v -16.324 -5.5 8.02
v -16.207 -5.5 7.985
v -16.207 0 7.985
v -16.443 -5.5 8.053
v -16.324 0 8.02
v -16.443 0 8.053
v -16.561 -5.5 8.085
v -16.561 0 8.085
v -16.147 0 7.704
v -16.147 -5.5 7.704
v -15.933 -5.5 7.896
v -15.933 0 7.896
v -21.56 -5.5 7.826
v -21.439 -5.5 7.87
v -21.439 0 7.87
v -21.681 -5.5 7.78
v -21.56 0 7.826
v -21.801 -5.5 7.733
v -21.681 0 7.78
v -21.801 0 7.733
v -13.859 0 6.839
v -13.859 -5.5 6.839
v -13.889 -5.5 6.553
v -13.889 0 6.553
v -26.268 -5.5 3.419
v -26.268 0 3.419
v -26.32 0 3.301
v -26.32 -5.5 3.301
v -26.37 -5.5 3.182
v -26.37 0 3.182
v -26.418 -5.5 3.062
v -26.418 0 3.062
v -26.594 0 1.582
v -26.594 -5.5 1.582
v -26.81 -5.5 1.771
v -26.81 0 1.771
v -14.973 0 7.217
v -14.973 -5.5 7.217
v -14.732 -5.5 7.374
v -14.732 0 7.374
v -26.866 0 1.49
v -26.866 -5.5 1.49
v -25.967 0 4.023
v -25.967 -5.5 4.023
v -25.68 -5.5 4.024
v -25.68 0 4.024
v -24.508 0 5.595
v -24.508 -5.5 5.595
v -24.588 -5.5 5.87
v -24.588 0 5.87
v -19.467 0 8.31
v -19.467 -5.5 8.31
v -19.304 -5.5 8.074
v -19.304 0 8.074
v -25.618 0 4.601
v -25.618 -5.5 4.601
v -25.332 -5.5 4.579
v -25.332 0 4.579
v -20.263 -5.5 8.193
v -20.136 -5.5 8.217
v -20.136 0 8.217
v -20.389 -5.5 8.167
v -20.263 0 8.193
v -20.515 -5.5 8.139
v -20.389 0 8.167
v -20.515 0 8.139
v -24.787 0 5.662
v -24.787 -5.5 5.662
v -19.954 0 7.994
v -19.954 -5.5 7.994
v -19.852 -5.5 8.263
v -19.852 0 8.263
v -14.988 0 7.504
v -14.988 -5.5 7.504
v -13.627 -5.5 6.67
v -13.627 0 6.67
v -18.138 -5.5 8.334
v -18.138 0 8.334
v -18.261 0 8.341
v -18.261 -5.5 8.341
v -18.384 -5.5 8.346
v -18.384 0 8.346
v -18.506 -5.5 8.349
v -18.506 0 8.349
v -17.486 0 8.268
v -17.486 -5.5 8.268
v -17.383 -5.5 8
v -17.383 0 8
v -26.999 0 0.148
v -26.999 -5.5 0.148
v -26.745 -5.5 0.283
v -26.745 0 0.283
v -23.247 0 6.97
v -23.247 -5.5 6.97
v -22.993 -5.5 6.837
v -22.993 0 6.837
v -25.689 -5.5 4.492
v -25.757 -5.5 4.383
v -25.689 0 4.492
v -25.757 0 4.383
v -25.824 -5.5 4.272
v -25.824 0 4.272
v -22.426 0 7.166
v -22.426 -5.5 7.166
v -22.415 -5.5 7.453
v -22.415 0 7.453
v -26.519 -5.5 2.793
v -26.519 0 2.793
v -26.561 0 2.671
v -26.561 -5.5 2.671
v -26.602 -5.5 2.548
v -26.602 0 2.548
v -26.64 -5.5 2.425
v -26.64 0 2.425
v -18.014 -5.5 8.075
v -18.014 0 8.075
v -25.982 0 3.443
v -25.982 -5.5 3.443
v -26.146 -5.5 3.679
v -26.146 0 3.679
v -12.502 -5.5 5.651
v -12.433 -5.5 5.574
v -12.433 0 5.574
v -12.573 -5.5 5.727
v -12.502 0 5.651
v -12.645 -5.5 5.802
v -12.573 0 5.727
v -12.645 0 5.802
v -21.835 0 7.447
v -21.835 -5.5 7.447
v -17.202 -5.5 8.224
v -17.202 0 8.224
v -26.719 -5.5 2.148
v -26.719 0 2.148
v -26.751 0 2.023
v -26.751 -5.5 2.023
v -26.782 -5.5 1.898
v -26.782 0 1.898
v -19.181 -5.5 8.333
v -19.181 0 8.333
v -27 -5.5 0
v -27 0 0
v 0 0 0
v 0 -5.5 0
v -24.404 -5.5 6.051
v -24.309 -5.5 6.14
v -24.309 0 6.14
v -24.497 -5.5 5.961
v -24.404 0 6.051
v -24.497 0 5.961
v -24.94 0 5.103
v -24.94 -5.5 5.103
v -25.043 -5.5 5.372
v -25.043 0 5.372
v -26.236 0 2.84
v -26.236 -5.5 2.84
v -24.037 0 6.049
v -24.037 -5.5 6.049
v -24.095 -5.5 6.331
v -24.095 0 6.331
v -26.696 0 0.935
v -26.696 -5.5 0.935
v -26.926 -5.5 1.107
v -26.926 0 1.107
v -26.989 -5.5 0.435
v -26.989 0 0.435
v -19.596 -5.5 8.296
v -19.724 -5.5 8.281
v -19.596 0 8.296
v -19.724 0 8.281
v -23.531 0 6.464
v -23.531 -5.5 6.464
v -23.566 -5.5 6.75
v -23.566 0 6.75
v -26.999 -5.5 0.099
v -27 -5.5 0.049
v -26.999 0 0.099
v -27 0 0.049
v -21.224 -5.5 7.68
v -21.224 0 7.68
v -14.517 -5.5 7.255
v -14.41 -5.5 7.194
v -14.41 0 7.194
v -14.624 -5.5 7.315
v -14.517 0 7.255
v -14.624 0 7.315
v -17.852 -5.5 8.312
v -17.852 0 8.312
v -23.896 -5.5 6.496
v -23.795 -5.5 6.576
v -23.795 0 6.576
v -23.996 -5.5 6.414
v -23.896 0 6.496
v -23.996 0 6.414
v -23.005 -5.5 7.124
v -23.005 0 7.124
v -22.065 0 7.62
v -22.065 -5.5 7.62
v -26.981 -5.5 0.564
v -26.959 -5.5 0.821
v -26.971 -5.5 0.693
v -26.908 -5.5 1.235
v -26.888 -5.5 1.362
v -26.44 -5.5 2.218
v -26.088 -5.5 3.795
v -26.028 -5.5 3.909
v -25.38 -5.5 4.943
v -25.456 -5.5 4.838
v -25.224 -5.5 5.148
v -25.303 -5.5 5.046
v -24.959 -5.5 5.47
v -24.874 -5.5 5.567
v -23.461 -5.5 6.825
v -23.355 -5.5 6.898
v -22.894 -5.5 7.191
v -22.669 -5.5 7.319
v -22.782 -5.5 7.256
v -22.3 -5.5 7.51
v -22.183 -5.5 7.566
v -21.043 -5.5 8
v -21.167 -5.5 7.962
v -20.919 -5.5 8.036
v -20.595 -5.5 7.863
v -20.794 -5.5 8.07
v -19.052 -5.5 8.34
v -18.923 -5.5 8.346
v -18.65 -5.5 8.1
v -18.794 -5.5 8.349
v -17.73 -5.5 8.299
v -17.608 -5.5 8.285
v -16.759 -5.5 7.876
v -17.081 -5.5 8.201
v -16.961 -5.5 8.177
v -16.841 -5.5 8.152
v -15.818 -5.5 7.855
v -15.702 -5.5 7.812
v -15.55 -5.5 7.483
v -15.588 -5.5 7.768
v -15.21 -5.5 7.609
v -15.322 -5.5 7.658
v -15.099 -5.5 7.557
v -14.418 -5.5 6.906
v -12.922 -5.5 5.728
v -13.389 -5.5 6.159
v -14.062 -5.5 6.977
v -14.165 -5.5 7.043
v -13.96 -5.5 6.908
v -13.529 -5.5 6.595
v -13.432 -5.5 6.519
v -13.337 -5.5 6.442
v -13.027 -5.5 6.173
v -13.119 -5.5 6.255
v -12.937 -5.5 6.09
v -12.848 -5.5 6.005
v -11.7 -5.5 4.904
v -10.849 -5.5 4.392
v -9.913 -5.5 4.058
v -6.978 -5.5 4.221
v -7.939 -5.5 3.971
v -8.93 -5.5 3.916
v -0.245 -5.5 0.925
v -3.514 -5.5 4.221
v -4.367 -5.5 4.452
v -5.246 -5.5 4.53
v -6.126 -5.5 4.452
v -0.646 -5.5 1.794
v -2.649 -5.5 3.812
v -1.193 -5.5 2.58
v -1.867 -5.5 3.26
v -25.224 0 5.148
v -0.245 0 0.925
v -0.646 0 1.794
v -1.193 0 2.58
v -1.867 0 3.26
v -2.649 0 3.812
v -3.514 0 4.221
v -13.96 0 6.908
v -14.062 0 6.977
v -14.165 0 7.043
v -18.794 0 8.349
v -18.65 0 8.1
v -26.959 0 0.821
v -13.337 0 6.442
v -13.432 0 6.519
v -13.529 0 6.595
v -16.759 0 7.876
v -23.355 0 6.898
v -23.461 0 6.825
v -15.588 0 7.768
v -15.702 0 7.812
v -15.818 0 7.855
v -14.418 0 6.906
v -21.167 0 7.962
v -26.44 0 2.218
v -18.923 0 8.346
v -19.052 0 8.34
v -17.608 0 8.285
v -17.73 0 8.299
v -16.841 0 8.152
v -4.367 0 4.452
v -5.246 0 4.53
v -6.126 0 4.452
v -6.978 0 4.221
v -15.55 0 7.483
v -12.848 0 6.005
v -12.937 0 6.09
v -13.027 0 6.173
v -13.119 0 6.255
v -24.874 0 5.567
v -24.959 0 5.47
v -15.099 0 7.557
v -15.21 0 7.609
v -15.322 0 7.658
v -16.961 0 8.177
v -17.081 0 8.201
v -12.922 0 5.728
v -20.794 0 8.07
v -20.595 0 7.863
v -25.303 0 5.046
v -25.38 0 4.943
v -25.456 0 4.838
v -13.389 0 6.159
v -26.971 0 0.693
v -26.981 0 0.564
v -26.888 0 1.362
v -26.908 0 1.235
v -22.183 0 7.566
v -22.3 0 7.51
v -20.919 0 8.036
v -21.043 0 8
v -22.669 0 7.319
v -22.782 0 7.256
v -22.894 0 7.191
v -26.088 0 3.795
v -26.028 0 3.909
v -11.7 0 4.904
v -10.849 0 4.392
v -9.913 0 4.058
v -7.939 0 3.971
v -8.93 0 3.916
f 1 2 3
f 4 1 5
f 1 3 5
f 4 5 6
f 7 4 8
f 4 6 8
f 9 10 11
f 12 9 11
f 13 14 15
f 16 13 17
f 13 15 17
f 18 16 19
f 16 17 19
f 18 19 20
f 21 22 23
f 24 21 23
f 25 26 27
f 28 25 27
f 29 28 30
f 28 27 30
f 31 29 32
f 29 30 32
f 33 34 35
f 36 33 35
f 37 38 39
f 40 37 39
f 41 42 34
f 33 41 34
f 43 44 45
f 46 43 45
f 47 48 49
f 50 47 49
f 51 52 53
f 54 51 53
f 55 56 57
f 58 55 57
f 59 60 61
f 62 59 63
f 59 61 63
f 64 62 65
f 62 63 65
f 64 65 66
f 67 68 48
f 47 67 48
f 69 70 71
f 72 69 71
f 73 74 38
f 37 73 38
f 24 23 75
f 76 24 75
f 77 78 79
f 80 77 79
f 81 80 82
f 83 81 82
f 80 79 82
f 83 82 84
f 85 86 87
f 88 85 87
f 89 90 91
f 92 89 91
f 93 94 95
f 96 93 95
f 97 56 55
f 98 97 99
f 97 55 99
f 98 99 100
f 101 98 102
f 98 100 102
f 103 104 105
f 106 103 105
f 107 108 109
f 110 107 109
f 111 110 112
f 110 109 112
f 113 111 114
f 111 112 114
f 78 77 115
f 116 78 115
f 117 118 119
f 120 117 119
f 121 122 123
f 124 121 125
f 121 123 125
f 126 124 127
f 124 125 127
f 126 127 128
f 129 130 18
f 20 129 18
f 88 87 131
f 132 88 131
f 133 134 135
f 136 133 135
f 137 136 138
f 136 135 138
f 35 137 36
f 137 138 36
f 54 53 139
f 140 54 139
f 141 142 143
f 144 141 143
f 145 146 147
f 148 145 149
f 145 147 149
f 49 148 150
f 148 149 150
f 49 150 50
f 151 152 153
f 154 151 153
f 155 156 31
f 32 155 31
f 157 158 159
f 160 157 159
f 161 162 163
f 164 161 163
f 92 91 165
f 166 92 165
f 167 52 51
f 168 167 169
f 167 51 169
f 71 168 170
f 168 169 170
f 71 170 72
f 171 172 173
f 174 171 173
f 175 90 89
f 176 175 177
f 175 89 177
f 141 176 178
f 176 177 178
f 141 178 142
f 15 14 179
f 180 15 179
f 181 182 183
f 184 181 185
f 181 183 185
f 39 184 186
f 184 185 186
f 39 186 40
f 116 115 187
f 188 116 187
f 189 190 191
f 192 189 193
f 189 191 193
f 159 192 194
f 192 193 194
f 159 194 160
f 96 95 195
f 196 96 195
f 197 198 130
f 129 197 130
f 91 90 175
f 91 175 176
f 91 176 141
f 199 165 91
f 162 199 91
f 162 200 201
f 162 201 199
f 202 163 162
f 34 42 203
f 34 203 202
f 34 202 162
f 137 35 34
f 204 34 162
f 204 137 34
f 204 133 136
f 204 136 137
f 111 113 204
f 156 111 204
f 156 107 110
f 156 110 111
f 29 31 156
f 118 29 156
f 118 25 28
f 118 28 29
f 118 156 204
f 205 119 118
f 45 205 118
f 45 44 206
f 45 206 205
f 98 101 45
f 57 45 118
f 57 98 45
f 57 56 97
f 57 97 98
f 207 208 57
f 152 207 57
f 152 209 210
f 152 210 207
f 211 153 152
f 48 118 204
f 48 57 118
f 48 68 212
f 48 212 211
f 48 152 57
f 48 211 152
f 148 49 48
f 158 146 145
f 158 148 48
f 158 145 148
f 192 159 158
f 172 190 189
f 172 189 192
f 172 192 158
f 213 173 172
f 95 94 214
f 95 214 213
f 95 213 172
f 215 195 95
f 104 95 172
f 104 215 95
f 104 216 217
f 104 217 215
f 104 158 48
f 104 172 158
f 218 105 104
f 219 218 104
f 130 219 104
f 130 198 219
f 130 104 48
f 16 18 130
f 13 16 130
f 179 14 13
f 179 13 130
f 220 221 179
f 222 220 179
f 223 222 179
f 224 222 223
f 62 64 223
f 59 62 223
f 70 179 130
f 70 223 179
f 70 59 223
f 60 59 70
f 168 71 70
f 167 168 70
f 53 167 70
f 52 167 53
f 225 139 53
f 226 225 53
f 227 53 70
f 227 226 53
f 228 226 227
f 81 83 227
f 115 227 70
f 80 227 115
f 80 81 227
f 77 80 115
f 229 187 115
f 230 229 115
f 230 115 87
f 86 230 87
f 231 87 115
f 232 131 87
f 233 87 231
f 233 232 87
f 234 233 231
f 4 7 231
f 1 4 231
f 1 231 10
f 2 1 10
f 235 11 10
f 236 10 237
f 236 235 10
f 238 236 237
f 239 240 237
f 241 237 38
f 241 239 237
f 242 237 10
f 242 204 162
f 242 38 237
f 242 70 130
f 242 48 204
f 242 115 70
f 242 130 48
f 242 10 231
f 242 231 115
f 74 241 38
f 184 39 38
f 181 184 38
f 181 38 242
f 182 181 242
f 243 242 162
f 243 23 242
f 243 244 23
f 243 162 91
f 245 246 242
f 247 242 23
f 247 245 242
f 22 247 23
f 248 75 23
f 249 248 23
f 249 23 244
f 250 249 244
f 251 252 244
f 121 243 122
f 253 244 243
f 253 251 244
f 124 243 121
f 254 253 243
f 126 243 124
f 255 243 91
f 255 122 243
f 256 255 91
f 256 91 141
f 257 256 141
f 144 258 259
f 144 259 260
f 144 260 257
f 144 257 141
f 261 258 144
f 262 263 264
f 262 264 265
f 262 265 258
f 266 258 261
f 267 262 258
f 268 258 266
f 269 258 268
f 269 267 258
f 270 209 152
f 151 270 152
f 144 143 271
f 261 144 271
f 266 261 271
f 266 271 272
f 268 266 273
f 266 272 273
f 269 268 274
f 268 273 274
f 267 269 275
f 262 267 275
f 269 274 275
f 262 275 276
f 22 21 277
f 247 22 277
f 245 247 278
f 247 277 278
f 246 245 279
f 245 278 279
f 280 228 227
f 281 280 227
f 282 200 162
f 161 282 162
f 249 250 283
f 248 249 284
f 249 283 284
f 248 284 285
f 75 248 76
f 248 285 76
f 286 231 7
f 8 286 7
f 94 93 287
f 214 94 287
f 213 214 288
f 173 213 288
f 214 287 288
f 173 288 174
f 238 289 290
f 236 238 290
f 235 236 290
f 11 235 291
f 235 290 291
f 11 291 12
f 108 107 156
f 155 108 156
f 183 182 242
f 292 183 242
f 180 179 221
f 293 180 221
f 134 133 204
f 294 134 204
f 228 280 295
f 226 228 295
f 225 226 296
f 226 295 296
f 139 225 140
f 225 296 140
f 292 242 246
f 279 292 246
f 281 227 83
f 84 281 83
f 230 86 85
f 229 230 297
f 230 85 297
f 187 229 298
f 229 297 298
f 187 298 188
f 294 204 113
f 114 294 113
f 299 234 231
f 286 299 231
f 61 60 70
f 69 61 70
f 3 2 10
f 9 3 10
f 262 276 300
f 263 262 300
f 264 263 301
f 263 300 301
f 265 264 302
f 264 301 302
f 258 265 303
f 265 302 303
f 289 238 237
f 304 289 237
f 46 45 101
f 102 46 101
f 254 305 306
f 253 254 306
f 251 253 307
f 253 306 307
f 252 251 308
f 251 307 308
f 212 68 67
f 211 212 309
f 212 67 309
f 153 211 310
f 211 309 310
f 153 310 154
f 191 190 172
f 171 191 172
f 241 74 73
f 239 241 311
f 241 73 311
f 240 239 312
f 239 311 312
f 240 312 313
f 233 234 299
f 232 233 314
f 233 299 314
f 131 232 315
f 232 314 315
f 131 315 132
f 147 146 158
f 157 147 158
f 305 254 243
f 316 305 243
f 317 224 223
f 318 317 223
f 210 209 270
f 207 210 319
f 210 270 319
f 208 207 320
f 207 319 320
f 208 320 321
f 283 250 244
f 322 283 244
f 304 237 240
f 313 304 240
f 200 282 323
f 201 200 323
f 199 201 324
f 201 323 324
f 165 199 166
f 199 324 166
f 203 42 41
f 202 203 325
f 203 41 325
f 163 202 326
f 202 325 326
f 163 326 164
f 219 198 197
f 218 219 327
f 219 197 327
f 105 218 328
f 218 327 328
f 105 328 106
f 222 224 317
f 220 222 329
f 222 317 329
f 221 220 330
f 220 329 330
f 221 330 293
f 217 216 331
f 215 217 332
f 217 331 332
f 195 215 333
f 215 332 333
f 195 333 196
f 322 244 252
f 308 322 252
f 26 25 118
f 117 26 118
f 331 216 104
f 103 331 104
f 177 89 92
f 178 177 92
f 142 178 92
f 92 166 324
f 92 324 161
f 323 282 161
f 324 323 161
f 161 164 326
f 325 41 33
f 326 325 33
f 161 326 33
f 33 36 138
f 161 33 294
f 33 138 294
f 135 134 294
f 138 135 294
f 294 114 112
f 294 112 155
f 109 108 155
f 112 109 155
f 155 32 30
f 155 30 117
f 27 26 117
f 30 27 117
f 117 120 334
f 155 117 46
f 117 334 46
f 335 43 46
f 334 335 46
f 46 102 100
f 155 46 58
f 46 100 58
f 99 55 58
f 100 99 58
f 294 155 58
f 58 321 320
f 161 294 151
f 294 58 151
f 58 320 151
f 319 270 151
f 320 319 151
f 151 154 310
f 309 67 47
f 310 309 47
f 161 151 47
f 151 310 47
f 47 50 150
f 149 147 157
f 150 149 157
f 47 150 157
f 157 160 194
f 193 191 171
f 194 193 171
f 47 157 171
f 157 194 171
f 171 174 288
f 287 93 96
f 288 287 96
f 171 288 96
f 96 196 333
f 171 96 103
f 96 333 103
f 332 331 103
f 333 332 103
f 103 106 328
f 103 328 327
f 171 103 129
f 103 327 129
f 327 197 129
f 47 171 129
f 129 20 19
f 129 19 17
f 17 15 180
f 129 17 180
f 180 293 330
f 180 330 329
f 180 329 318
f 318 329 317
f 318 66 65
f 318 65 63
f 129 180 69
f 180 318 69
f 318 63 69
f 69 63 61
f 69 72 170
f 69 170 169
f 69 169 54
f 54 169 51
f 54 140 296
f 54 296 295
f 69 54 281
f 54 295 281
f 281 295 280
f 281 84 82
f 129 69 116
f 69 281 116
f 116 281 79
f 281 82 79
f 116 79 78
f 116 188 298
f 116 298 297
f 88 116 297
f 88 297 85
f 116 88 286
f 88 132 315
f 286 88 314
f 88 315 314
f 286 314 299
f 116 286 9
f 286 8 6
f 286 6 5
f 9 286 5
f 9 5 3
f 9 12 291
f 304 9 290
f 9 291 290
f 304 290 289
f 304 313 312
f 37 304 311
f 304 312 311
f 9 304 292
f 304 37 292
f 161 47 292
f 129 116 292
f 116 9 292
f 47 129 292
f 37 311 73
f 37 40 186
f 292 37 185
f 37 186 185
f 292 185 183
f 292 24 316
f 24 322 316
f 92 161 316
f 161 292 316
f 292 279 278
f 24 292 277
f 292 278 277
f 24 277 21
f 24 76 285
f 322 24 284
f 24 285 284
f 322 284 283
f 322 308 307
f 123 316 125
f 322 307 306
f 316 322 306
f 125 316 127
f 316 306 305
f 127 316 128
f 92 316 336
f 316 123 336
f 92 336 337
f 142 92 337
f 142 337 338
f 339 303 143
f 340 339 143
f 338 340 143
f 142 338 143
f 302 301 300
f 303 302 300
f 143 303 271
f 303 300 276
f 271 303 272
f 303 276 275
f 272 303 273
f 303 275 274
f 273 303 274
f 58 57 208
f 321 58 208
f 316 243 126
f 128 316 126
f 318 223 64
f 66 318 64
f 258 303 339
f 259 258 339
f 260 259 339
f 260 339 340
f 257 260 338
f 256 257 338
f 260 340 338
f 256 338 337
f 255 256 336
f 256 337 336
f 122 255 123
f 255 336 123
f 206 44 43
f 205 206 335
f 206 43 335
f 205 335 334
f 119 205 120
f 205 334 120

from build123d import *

# Parameters (mm, degrees)
F1_DEPTH         = 5.5
F3_DEPTH         = 5.501
F3_COPIES_COUNT  = 20
F3_COPIES_ANGLE  = 88.0004
F3_COPIES1_COUNT = 11
F3_COPIES1_ANGLE = 45


# Not quite as in the source:
# - a pattern or mirror of a feature is missing from the dataset's text; its kind, count and spacing are read off the source's solid


with BuildPart() as f1:
    # F0 (on Front) → F1 (new body)
    with BuildSketch(Plane.XZ):
        with BuildLine():
            Line((-27, 0), (0, 0))
            ThreePointArc((0, 0), (-1.1926360457, 2.5804184186), (-3.5143684573, 4.2206923475))
            ThreePointArc((-3.5143684573, 4.2206923475), (-5.2460959941, 4.5301572247), (-6.977823531, 4.2206923475))
            ThreePointArc((-6.977823531, 4.2206923475), (-9.9132769797, 4.0582856894), (-12.4325656492, 5.5736890919))
            ThreePointArc((-12.4325656492, 5.5736890919), (-21.6338668847, 7.7986561929), (-27, 0))
        make_face()
    extrude(amount=F1_DEPTH)

    # F2 (on face) → F3 (cut, through all)
    with BuildSketch(Plane.XZ.offset(5.5)):
        with BuildLine():
            ThreePointArc((-18.5063756326, 8.3487647015), (-18.65, 8.35), (-18.7936243674, 8.3487647015))
            Line((-18.7936243674, 8.3487647015), (-18.65, 8.1))
            Line((-18.65, 8.1), (-18.5063756326, 8.3487647015))
        make_face()
    f3 = extrude(amount=-F3_DEPTH, mode=Mode.SUBTRACT)

    # F3_copies: F3 ×20 about axis
    f3_copies_axis = Axis((-18.65, 0, 0), (0, -1, 0))
    for i in range(1, F3_COPIES_COUNT):
        add(f3.rotate(f3_copies_axis, i * F3_COPIES_ANGLE / (F3_COPIES_COUNT - 1)), mode=Mode.SUBTRACT)

    # F3_copies1: F3 ×11 about axis
    f3_copies1_axis = Axis((-18.65, 0, 0), (0, 1, 0))
    for i in range(1, F3_COPIES1_COUNT):
        add(f3.rotate(f3_copies1_axis, i * F3_COPIES1_ANGLE / (F3_COPIES1_COUNT - 1)), mode=Mode.SUBTRACT)


solid = f1.part
